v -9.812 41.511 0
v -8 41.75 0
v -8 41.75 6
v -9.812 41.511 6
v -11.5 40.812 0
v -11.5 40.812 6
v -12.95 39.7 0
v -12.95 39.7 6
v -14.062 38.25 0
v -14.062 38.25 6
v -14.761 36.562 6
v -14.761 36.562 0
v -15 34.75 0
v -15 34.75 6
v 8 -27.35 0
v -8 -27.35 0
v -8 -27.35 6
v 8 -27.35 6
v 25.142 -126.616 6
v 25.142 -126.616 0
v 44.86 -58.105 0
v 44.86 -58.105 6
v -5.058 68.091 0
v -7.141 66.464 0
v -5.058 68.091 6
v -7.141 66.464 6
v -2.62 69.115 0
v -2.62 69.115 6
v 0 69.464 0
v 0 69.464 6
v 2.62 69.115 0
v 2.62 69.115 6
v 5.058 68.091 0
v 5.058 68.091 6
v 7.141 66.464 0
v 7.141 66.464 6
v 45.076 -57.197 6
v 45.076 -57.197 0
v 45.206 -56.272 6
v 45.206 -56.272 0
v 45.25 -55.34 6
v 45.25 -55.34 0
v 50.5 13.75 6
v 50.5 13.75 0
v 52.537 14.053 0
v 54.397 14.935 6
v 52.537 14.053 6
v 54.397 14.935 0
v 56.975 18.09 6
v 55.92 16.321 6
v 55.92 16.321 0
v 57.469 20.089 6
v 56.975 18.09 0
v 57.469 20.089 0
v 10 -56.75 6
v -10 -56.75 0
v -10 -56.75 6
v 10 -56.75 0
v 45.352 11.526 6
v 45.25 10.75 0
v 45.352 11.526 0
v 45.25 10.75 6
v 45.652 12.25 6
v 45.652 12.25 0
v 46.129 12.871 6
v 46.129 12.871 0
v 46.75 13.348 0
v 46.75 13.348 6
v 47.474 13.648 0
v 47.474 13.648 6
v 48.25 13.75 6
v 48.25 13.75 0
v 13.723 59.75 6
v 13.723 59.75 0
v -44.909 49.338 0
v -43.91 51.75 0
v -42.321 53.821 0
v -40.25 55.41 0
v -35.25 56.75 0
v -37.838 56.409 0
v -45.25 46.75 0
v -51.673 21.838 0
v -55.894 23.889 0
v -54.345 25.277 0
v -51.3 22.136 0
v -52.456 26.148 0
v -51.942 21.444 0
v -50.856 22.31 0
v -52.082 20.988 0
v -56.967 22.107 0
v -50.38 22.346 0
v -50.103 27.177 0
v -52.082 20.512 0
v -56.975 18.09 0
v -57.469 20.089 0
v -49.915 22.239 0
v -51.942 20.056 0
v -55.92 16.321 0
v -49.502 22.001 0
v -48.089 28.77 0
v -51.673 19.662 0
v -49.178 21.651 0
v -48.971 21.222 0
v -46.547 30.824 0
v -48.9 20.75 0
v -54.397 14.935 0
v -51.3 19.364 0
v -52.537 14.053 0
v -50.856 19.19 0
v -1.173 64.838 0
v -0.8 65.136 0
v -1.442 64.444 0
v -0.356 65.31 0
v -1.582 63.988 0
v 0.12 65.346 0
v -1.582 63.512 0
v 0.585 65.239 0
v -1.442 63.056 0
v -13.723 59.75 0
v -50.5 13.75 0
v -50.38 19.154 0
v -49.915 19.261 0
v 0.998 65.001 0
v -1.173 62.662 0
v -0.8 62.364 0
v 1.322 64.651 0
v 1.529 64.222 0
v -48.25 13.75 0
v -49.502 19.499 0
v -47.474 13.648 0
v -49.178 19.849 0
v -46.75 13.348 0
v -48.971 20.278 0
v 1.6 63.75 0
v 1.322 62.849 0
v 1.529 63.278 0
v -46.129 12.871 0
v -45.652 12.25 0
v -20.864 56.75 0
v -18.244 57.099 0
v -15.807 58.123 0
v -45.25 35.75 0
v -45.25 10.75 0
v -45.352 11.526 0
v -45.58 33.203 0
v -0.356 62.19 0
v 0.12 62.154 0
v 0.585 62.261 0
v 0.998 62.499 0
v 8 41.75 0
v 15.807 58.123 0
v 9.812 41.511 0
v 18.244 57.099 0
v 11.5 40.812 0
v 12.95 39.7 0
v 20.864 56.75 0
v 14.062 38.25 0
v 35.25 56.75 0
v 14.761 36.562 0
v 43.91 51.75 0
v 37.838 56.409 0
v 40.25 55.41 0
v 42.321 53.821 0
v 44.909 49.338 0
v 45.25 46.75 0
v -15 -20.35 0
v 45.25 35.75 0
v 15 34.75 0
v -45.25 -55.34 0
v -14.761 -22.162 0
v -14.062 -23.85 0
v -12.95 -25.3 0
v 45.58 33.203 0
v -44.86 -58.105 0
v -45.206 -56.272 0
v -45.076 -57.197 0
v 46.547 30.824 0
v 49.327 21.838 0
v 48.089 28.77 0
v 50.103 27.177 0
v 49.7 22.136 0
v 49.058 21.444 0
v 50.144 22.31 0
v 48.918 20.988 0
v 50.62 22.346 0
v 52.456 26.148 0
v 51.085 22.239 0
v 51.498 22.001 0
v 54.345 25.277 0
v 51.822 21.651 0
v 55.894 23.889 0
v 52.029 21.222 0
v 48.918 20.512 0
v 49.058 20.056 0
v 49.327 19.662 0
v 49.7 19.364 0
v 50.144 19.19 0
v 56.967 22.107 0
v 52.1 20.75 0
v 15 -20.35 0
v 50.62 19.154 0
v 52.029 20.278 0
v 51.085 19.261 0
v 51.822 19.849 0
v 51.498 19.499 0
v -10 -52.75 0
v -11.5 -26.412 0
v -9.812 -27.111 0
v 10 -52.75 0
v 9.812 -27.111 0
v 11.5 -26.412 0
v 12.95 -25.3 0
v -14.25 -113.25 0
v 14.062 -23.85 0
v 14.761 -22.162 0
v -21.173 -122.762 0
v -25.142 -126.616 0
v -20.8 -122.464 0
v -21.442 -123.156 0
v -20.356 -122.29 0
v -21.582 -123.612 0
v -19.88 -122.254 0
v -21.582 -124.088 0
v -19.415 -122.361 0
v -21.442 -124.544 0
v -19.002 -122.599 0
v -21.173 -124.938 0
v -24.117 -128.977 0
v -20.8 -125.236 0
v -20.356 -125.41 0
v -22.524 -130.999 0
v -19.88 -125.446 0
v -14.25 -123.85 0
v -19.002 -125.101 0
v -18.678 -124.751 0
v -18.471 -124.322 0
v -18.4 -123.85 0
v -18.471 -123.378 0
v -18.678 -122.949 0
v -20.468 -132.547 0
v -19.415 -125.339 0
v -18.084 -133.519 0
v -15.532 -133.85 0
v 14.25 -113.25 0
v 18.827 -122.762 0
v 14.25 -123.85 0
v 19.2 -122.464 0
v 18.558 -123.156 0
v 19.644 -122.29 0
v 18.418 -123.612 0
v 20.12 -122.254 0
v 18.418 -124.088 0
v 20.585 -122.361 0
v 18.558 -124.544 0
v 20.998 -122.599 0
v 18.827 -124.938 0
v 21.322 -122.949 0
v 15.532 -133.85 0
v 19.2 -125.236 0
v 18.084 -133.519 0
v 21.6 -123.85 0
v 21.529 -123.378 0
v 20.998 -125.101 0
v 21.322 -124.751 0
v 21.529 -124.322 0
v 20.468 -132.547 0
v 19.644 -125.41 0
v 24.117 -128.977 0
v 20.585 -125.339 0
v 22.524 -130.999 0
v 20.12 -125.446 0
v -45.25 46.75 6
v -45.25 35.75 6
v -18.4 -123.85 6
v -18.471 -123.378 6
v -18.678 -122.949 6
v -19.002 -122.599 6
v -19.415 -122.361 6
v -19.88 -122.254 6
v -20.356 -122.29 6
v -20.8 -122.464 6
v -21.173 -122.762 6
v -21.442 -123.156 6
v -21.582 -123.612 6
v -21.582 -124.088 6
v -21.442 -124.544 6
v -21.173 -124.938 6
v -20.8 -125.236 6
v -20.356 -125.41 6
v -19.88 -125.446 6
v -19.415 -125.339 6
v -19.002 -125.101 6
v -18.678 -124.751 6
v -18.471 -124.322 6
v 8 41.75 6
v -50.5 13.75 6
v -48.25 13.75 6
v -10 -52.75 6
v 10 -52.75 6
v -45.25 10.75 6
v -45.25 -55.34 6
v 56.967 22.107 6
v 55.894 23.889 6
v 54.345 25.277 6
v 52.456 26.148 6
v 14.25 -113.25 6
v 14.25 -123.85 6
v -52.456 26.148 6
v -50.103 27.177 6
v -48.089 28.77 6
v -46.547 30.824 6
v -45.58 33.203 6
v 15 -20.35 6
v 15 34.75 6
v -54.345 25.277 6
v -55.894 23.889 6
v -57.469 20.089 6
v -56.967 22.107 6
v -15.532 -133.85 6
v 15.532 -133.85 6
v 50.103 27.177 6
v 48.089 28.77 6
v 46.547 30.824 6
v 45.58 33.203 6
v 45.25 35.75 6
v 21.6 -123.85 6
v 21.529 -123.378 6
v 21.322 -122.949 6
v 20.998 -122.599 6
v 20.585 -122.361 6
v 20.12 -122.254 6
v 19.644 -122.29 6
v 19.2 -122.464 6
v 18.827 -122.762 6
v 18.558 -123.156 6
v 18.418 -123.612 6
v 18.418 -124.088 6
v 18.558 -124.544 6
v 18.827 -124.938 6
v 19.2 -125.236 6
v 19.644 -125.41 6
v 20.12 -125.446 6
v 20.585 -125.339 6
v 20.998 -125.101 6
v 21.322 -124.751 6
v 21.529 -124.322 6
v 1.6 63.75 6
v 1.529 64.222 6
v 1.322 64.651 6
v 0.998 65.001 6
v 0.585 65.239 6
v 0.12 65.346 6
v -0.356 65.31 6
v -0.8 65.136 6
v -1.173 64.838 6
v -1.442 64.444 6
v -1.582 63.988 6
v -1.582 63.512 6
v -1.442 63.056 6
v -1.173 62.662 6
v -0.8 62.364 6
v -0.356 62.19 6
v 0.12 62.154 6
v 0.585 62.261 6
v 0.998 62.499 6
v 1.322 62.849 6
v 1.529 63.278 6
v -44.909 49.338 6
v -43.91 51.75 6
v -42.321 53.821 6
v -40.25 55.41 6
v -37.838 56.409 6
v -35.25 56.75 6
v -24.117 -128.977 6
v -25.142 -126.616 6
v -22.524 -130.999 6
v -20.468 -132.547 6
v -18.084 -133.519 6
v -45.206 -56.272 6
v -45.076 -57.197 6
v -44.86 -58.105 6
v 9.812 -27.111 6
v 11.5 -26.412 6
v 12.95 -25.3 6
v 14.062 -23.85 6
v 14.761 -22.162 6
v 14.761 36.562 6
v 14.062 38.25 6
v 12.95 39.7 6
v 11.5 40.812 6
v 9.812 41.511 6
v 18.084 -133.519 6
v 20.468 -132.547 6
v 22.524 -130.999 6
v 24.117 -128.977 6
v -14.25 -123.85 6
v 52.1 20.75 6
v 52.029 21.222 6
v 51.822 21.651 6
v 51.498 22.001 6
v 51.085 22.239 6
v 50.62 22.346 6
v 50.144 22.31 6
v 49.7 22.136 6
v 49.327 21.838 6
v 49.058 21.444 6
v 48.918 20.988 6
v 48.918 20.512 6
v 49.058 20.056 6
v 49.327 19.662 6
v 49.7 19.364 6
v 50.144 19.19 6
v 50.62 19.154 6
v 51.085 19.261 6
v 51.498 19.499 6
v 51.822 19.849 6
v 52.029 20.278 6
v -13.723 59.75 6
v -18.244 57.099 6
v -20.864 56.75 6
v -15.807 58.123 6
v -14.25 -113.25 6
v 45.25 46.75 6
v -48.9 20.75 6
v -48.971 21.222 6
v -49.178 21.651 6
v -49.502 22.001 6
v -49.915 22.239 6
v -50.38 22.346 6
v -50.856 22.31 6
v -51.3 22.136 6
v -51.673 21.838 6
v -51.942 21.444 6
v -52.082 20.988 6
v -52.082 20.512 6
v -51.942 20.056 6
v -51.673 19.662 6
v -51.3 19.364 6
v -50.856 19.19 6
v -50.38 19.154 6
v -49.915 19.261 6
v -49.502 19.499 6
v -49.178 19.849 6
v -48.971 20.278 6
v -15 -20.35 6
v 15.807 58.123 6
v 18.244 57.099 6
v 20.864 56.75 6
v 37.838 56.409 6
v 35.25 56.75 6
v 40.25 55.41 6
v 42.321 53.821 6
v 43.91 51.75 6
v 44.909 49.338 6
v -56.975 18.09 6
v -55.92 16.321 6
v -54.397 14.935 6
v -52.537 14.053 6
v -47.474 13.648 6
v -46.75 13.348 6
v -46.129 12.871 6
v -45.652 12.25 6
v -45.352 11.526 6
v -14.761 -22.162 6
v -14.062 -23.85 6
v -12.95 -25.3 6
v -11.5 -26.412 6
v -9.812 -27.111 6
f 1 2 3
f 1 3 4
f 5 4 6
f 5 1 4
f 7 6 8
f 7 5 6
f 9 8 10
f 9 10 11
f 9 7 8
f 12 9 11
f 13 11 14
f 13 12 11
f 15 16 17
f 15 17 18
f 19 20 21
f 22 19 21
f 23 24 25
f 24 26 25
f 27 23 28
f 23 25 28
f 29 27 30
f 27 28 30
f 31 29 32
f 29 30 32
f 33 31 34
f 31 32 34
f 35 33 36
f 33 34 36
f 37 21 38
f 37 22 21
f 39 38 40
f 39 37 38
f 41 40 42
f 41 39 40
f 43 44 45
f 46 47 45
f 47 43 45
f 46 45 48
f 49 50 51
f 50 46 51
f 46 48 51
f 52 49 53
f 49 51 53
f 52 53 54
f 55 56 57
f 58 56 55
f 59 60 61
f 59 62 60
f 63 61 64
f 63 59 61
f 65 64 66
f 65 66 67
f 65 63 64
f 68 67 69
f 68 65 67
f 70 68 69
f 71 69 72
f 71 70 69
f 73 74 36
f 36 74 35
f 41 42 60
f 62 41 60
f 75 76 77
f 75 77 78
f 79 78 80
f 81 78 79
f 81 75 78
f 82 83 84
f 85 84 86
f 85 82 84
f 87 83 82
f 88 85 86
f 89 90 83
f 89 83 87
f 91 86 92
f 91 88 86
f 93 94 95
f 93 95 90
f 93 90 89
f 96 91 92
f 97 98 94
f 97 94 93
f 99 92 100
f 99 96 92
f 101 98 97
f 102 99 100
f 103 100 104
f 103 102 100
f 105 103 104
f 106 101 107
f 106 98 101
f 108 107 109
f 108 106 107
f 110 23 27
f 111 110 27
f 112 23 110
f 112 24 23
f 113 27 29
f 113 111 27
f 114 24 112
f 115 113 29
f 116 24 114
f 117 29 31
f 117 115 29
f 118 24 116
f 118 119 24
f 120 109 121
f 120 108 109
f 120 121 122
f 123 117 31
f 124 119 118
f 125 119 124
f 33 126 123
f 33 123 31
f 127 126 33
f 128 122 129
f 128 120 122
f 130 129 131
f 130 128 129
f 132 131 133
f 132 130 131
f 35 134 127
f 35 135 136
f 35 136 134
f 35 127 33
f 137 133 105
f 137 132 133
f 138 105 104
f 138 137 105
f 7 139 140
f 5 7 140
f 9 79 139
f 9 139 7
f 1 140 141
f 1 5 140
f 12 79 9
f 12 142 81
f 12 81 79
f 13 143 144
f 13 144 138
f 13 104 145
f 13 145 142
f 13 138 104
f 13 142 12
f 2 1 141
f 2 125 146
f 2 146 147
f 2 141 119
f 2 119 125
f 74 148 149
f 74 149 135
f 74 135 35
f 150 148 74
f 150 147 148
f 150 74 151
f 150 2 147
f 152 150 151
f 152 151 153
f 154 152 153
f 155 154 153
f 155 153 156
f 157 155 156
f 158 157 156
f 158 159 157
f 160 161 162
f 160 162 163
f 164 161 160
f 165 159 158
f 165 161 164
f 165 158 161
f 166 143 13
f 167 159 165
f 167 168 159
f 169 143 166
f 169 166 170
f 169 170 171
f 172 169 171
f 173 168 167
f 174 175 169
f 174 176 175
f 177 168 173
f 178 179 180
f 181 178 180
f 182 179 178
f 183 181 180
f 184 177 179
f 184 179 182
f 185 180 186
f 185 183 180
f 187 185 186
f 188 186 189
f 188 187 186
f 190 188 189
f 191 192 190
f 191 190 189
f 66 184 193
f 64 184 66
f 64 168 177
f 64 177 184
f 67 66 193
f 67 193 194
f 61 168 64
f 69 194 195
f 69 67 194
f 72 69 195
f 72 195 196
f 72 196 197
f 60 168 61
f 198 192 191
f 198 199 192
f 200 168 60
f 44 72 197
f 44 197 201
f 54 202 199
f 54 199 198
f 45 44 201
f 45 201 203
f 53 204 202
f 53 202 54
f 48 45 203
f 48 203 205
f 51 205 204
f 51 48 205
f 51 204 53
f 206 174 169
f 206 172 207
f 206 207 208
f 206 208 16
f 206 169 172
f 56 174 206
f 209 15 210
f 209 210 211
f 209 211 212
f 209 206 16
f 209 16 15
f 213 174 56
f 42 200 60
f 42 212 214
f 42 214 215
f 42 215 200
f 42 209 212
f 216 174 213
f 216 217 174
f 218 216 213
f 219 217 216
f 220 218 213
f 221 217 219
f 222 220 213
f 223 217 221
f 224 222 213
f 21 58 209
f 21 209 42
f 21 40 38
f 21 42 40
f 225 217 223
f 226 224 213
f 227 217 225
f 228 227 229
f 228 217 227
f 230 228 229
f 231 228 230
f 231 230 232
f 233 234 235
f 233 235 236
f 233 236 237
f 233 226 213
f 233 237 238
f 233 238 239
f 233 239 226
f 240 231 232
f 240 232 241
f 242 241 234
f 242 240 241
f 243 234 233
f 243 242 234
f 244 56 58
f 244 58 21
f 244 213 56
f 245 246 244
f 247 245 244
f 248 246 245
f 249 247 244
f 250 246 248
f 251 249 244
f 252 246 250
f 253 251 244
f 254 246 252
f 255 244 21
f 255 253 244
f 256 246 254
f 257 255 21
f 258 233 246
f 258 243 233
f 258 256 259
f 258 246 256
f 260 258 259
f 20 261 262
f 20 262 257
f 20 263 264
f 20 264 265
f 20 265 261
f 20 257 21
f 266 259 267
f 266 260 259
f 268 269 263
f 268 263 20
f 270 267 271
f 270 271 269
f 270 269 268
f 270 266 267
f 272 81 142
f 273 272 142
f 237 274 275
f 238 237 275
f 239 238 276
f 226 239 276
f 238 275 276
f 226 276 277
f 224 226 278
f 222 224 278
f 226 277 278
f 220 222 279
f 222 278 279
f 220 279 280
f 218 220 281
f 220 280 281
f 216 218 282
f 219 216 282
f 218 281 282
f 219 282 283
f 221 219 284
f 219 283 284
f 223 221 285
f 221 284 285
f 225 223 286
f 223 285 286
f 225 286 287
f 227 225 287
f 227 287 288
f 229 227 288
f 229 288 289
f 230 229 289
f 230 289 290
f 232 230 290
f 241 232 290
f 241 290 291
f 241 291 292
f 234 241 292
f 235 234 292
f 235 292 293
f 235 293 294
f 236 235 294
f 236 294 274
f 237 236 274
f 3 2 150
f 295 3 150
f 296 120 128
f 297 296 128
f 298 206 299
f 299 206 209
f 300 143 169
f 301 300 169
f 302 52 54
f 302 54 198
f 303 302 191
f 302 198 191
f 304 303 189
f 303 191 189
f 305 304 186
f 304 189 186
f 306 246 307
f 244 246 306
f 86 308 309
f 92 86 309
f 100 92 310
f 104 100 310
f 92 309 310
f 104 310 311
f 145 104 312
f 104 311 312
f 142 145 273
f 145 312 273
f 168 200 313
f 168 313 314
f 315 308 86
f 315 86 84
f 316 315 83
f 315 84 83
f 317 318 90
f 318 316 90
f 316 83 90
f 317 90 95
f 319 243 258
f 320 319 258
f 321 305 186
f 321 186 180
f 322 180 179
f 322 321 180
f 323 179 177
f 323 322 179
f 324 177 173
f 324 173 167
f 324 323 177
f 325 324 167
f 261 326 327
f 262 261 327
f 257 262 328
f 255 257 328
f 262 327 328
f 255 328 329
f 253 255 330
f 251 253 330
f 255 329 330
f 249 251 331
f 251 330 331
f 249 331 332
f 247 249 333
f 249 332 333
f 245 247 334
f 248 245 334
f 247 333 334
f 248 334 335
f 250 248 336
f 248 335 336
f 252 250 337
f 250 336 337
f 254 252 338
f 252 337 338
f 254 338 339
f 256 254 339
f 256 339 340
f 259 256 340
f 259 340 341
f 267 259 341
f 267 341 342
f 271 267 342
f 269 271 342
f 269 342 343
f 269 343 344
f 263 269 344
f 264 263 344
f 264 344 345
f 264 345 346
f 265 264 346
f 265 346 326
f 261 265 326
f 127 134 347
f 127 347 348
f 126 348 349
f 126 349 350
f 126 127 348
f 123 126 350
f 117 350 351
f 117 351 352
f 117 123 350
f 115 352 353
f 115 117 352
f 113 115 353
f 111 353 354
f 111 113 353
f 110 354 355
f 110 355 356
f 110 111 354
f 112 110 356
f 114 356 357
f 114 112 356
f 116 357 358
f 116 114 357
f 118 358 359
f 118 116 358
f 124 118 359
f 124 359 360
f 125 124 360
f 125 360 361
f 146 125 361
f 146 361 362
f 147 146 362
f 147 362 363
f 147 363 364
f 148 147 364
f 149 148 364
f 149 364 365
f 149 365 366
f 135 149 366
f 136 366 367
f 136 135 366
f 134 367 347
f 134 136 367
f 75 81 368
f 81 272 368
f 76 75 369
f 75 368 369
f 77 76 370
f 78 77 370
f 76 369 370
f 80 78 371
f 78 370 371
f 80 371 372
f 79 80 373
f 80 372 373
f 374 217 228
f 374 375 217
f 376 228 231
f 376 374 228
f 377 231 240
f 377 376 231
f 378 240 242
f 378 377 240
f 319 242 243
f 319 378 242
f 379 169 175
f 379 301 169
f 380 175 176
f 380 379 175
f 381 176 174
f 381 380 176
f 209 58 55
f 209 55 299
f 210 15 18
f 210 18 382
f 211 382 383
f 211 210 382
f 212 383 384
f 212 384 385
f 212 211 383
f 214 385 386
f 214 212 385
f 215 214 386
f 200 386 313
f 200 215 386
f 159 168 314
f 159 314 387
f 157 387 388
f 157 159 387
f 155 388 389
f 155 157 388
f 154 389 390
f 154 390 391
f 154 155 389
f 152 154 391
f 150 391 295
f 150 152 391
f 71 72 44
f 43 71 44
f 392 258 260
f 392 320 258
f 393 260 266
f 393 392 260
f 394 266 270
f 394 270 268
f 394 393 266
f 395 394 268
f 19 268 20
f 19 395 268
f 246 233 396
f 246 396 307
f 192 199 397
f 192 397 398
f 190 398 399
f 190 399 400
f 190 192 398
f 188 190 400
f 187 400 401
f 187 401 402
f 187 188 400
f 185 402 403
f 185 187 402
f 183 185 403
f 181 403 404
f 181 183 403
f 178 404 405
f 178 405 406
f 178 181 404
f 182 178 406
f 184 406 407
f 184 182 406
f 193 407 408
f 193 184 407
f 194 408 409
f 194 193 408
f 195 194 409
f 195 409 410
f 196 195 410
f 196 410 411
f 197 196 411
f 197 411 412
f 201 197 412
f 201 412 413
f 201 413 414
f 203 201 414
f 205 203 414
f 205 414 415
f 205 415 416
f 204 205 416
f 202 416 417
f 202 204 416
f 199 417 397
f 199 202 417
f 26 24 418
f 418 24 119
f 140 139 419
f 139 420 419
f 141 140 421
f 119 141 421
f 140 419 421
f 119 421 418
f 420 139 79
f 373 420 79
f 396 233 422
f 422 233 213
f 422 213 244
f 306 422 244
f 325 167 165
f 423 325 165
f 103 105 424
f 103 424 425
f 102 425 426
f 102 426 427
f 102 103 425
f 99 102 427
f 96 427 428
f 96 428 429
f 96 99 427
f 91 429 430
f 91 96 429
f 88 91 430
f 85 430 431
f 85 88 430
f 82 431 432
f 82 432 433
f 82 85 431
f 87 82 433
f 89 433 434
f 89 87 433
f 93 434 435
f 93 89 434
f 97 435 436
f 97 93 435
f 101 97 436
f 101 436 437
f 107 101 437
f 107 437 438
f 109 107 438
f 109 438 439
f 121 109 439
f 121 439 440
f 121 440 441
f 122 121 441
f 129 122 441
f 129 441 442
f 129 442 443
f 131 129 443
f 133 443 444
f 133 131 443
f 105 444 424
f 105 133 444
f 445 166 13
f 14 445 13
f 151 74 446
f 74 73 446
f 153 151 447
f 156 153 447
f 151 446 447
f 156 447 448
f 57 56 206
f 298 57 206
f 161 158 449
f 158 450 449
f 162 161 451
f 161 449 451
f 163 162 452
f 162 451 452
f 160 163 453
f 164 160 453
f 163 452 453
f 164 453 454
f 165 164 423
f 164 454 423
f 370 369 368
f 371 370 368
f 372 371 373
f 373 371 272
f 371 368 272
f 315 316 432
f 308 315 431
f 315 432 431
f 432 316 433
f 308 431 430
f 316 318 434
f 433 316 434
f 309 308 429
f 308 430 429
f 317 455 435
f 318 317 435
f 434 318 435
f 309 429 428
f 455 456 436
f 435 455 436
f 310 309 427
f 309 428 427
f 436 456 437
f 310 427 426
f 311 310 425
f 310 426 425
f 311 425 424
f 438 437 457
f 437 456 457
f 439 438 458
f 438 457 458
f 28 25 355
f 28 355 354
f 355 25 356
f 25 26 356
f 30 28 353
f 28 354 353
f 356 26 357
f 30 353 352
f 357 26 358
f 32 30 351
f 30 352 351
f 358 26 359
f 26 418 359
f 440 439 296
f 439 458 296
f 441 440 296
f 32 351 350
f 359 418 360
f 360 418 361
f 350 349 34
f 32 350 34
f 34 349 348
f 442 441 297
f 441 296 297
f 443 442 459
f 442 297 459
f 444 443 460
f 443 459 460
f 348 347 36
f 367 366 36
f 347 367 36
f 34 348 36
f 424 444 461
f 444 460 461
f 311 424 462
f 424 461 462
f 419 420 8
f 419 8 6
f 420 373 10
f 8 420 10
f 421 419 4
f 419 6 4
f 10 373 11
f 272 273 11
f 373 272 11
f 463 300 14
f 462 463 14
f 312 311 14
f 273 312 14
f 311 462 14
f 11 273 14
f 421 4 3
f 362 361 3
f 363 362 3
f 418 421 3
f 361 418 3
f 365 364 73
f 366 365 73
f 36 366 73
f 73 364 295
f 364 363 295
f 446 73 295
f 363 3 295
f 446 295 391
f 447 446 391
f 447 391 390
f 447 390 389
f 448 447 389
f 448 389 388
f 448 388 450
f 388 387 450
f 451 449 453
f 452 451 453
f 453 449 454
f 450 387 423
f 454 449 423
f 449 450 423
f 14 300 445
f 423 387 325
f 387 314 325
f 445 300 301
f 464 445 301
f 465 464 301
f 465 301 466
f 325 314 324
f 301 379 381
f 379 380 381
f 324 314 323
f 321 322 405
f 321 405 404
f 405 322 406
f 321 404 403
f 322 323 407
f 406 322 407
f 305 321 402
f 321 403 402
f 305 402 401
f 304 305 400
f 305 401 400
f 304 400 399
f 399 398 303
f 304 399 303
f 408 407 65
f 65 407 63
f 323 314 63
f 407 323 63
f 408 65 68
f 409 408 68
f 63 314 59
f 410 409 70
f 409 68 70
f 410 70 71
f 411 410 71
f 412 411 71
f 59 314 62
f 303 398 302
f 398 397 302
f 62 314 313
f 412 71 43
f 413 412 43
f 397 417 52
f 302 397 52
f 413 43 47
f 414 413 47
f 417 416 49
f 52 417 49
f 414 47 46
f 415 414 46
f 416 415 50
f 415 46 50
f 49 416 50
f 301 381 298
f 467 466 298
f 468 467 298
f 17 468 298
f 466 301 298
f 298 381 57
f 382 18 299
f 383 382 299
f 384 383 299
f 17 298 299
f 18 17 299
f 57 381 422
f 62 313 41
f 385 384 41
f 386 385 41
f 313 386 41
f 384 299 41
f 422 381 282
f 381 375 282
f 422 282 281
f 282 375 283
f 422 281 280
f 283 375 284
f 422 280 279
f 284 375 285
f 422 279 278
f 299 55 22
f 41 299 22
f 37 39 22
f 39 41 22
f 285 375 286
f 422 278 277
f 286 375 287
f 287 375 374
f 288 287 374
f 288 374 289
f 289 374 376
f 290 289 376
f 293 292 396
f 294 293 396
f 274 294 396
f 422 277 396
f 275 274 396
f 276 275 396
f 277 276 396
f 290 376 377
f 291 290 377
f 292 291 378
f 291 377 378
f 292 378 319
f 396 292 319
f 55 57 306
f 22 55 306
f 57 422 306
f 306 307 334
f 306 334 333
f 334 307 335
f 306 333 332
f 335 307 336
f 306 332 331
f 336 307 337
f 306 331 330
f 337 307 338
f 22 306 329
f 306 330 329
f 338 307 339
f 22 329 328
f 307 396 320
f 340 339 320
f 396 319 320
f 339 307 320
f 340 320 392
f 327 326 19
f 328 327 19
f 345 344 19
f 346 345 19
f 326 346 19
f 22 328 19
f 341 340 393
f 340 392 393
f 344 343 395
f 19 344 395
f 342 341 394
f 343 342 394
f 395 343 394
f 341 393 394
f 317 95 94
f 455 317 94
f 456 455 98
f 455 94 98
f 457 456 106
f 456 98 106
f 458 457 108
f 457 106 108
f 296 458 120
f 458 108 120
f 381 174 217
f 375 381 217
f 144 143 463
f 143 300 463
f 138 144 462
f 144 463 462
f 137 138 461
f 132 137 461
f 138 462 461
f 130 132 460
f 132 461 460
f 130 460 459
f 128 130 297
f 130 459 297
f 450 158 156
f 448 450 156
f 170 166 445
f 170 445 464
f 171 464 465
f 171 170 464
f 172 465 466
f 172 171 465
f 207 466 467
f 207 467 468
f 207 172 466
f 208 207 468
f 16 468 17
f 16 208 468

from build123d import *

# Parameters (mm, degrees)
ESBO_O1_R                = 1.6
ESBO_O1_W                = 28.5
ESBO_O1_H                = 10.6
ESBO_O1_W_2              = 30
ESBO_O1_H_2              = 69.1
ESBO_O1_W_3              = 20
ESBO_O1_H_3              = 4
RESSALTO_EXTRUS_O1_DEPTH = 6
FILETE3_R                = 3
FILETE4_R                = 10
FILETE5_R                = 7
ESBO_O2_R                = 1.6
CORTE_EXTRUS_O1_DEPTH    = 10


with BuildPart() as part:
    # Esboço1 → Ressalto-extrusão1 (new body)
    with BuildSketch(Plane.XY):
        Polygon((-45.25, -56.75), (-23.05952475, -133.85), (23.05952475, -133.85), (45.25, -56.75), (45.25, 13.75), (57.5, 13.75), (57.5, 25.75), (45.25, 25.75), (45.25, 56.75), (16.663333, 56.75), (0, 73.75), (-16.663333, 56.75), (-45.25, 56.75), (-45.25, 25.75), (-57.5, 25.75), (-57.5, 13.75), (-45.25, 13.75), align=None)
        with Locations((0, 63.75)):
            Circle(ESBO_O1_R, mode=Mode.SUBTRACT)
        with Locations((-50.5, 20.75)):
            Circle(ESBO_O1_R, mode=Mode.SUBTRACT)
        with Locations((50.5, 20.75)):
            Circle(ESBO_O1_R, mode=Mode.SUBTRACT)
        with Locations((0, -118.55)):
            Rectangle(ESBO_O1_W, ESBO_O1_H, mode=Mode.SUBTRACT)
        with Locations((0, 7.2)):
            Rectangle(ESBO_O1_W_2, ESBO_O1_H_2, mode=Mode.SUBTRACT)
        with Locations((0, -54.75)):
            Rectangle(ESBO_O1_W_3, ESBO_O1_H_3, mode=Mode.SUBTRACT)
    extrude(amount=RESSALTO_EXTRUS_O1_DEPTH)

    # Filete3
    filete3_edges = [part.edges().sort_by_distance(p)[0] for p in [
        (-45.25, 13.75, 3),
        (45.25, 13.75, 3),
    ]]
    fillet(filete3_edges, radius=FILETE3_R)

    # Filete4
    filete4_edges = [part.edges().sort_by_distance(p)[0] for p in [
        (-45.25, 25.75, 3),
        (-45.25, 56.75, 3),
        (-16.663333, 56.75, 3),
        (0, 73.75, 3),
        (16.663333, 56.75, 3),
        (45.25, 56.75, 3),
        (45.25, 25.75, 3),
        (45.25, -56.75, 3),
        (23.05952475, -133.85, 3),
        (-23.05952475, -133.85, 3),
        (-45.25, -56.75, 3),
    ]]
    fillet(filete4_edges, radius=FILETE4_R)

    # Filete5
    # the kernel refuses this fillet: 7 mm, written as the material it adds along each edge
    with BuildSketch(Plane(origin=(-15, -27.35, 0), x_dir=(1, 0, 0), z_dir=(0, 0, 1)), Plane(origin=(15, 41.75, 0), x_dir=(-1, 0, 0), z_dir=(0, 0, 1)), Plane(origin=(-15, 41.75, 0), x_dir=(0, -1, 0), z_dir=(0, 0, 1))) as filete5_piece_1:
        with BuildLine():
            CenterArc((FILETE5_R, FILETE5_R), FILETE5_R, 180, 90)
            Line((0, FILETE5_R), (0, 0))
            Line((0, 0), (FILETE5_R, 0))
        make_face()
    extrude(amount=6)
    with BuildSketch(Plane(origin=(15, -27.35, 0), x_dir=(-1, 0, 0), z_dir=(0, 0, 1))) as filete5_piece_2:
        with BuildLine():
            CenterArc((FILETE5_R, -FILETE5_R), FILETE5_R, 90, 90)
            Line((0, -FILETE5_R), (0, 0))
            Line((0, 0), (FILETE5_R, 0))
        make_face()
    extrude(amount=6)
    # the kernel refuses this fillet: 7 mm, written as the material it takes off along each edge
    with BuildSketch(Plane(origin=(57.5, 13.75, -17.5), x_dir=(-1, 0, 0), z_dir=(0, 0, 1))) as filete5_2_piece_1:
        with BuildLine():
            CenterArc((FILETE5_R, -FILETE5_R), FILETE5_R, 90, 90)
            Line((0, -FILETE5_R), (0, 0))
            Line((0, 0), (FILETE5_R, 0))
        make_face()
    extrude(amount=41, mode=Mode.SUBTRACT)
    with BuildSketch(Plane(origin=(57.5, 25.75, -15.807283357), x_dir=(0, -1, 0), z_dir=(0, 0, 1))) as filete5_2_piece_2:
        with BuildLine():
            CenterArc((6.322913343, -7), FILETE5_R, 90, 73.774899865)
            Line((-0.398286269, -5.044117647), (-1.07040623, -4.848529412))
            ThreePointArc((-1.07040623, -4.848529412), (-0.7, -2.25), (-0.7, 0))
            Line((-0.7, 0), (0, 0.7))
            Line((0, 0.7), (6.322913343, 0.7))
            Line((6.322913343, 0.7), (6.322913343, 0))
        make_face()
    extrude(amount=37.614566715, mode=Mode.SUBTRACT)
    with BuildSketch(Plane(origin=(-57.5, 13.75, -17.5), x_dir=(1, 0, 0), z_dir=(0, 0, 1))) as filete5_2_piece_3:
        with BuildLine():
            CenterArc((FILETE5_R, FILETE5_R), FILETE5_R, 180, 90)
            Line((0, FILETE5_R), (0, 0))
            Line((0, 0), (FILETE5_R, 0))
        make_face()
    extrude(amount=41, mode=Mode.SUBTRACT)
    with BuildSketch(Plane(origin=(-57.5, 25.75, -15.807283357), x_dir=(0, -1, 0), z_dir=(0, 0, 1))) as filete5_2_piece_4:
        with BuildLine():
            CenterArc((6.322913343, 7), FILETE5_R, 196.225100135, 73.774899865)
            Line((-0.398286269, 5.044117647), (-1.07040623, 4.848529412))
            ThreePointArc((-1.07040623, 4.848529412), (-0.7, 2.25), (-0.7, 0))
            Line((-0.7, 0), (0, -0.7))
            Line((0, -0.7), (6.322913343, -0.7))
            Line((6.322913343, -0.7), (6.322913343, 0))
        make_face()
    extrude(amount=37.614566715, mode=Mode.SUBTRACT)

    # Esboço2 → Corte-extrusão1 (cut)
    with BuildSketch(Plane.XY.offset(6)):
        with Locations((-20, -123.85)):
            Circle(ESBO_O2_R)
        with Locations((20, -123.85)):
            Circle(ESBO_O2_R)
    extrude(amount=-CORTE_EXTRUS_O1_DEPTH, mode=Mode.SUBTRACT)


solid = part.part
